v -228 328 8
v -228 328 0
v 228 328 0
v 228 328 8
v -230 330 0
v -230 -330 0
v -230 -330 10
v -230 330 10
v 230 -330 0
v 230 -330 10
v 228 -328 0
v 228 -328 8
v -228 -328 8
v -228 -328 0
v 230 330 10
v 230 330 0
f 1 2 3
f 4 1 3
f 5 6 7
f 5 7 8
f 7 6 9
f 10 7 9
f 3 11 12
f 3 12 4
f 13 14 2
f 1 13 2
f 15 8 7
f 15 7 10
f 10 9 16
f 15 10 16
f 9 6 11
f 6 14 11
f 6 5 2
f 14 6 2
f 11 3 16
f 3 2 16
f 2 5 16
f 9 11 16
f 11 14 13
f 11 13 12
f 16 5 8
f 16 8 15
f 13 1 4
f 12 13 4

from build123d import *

# Parameters (mm, degrees)
CROQUIS1_W              = 460
CROQUIS1_H              = 660
SALIENTE_EXTRUIR1_DEPTH = 10
VACIADO1_T              = -2


with BuildPart() as part:
    # Croquis1 → Saliente-Extruir1 (new body)
    with BuildSketch(Plane.XY):
        Rectangle(CROQUIS1_W, CROQUIS1_H)
    extrude(amount=SALIENTE_EXTRUIR1_DEPTH)

    # Vaciado1
    vaciado1_openings = [part.faces().sort_by_distance(p)[0] for p in [
        (0, 0, 0),
    ]]
    offset(amount=VACIADO1_T, openings=vaciado1_openings, kind=Kind.INTERSECTION)


solid = part.part
